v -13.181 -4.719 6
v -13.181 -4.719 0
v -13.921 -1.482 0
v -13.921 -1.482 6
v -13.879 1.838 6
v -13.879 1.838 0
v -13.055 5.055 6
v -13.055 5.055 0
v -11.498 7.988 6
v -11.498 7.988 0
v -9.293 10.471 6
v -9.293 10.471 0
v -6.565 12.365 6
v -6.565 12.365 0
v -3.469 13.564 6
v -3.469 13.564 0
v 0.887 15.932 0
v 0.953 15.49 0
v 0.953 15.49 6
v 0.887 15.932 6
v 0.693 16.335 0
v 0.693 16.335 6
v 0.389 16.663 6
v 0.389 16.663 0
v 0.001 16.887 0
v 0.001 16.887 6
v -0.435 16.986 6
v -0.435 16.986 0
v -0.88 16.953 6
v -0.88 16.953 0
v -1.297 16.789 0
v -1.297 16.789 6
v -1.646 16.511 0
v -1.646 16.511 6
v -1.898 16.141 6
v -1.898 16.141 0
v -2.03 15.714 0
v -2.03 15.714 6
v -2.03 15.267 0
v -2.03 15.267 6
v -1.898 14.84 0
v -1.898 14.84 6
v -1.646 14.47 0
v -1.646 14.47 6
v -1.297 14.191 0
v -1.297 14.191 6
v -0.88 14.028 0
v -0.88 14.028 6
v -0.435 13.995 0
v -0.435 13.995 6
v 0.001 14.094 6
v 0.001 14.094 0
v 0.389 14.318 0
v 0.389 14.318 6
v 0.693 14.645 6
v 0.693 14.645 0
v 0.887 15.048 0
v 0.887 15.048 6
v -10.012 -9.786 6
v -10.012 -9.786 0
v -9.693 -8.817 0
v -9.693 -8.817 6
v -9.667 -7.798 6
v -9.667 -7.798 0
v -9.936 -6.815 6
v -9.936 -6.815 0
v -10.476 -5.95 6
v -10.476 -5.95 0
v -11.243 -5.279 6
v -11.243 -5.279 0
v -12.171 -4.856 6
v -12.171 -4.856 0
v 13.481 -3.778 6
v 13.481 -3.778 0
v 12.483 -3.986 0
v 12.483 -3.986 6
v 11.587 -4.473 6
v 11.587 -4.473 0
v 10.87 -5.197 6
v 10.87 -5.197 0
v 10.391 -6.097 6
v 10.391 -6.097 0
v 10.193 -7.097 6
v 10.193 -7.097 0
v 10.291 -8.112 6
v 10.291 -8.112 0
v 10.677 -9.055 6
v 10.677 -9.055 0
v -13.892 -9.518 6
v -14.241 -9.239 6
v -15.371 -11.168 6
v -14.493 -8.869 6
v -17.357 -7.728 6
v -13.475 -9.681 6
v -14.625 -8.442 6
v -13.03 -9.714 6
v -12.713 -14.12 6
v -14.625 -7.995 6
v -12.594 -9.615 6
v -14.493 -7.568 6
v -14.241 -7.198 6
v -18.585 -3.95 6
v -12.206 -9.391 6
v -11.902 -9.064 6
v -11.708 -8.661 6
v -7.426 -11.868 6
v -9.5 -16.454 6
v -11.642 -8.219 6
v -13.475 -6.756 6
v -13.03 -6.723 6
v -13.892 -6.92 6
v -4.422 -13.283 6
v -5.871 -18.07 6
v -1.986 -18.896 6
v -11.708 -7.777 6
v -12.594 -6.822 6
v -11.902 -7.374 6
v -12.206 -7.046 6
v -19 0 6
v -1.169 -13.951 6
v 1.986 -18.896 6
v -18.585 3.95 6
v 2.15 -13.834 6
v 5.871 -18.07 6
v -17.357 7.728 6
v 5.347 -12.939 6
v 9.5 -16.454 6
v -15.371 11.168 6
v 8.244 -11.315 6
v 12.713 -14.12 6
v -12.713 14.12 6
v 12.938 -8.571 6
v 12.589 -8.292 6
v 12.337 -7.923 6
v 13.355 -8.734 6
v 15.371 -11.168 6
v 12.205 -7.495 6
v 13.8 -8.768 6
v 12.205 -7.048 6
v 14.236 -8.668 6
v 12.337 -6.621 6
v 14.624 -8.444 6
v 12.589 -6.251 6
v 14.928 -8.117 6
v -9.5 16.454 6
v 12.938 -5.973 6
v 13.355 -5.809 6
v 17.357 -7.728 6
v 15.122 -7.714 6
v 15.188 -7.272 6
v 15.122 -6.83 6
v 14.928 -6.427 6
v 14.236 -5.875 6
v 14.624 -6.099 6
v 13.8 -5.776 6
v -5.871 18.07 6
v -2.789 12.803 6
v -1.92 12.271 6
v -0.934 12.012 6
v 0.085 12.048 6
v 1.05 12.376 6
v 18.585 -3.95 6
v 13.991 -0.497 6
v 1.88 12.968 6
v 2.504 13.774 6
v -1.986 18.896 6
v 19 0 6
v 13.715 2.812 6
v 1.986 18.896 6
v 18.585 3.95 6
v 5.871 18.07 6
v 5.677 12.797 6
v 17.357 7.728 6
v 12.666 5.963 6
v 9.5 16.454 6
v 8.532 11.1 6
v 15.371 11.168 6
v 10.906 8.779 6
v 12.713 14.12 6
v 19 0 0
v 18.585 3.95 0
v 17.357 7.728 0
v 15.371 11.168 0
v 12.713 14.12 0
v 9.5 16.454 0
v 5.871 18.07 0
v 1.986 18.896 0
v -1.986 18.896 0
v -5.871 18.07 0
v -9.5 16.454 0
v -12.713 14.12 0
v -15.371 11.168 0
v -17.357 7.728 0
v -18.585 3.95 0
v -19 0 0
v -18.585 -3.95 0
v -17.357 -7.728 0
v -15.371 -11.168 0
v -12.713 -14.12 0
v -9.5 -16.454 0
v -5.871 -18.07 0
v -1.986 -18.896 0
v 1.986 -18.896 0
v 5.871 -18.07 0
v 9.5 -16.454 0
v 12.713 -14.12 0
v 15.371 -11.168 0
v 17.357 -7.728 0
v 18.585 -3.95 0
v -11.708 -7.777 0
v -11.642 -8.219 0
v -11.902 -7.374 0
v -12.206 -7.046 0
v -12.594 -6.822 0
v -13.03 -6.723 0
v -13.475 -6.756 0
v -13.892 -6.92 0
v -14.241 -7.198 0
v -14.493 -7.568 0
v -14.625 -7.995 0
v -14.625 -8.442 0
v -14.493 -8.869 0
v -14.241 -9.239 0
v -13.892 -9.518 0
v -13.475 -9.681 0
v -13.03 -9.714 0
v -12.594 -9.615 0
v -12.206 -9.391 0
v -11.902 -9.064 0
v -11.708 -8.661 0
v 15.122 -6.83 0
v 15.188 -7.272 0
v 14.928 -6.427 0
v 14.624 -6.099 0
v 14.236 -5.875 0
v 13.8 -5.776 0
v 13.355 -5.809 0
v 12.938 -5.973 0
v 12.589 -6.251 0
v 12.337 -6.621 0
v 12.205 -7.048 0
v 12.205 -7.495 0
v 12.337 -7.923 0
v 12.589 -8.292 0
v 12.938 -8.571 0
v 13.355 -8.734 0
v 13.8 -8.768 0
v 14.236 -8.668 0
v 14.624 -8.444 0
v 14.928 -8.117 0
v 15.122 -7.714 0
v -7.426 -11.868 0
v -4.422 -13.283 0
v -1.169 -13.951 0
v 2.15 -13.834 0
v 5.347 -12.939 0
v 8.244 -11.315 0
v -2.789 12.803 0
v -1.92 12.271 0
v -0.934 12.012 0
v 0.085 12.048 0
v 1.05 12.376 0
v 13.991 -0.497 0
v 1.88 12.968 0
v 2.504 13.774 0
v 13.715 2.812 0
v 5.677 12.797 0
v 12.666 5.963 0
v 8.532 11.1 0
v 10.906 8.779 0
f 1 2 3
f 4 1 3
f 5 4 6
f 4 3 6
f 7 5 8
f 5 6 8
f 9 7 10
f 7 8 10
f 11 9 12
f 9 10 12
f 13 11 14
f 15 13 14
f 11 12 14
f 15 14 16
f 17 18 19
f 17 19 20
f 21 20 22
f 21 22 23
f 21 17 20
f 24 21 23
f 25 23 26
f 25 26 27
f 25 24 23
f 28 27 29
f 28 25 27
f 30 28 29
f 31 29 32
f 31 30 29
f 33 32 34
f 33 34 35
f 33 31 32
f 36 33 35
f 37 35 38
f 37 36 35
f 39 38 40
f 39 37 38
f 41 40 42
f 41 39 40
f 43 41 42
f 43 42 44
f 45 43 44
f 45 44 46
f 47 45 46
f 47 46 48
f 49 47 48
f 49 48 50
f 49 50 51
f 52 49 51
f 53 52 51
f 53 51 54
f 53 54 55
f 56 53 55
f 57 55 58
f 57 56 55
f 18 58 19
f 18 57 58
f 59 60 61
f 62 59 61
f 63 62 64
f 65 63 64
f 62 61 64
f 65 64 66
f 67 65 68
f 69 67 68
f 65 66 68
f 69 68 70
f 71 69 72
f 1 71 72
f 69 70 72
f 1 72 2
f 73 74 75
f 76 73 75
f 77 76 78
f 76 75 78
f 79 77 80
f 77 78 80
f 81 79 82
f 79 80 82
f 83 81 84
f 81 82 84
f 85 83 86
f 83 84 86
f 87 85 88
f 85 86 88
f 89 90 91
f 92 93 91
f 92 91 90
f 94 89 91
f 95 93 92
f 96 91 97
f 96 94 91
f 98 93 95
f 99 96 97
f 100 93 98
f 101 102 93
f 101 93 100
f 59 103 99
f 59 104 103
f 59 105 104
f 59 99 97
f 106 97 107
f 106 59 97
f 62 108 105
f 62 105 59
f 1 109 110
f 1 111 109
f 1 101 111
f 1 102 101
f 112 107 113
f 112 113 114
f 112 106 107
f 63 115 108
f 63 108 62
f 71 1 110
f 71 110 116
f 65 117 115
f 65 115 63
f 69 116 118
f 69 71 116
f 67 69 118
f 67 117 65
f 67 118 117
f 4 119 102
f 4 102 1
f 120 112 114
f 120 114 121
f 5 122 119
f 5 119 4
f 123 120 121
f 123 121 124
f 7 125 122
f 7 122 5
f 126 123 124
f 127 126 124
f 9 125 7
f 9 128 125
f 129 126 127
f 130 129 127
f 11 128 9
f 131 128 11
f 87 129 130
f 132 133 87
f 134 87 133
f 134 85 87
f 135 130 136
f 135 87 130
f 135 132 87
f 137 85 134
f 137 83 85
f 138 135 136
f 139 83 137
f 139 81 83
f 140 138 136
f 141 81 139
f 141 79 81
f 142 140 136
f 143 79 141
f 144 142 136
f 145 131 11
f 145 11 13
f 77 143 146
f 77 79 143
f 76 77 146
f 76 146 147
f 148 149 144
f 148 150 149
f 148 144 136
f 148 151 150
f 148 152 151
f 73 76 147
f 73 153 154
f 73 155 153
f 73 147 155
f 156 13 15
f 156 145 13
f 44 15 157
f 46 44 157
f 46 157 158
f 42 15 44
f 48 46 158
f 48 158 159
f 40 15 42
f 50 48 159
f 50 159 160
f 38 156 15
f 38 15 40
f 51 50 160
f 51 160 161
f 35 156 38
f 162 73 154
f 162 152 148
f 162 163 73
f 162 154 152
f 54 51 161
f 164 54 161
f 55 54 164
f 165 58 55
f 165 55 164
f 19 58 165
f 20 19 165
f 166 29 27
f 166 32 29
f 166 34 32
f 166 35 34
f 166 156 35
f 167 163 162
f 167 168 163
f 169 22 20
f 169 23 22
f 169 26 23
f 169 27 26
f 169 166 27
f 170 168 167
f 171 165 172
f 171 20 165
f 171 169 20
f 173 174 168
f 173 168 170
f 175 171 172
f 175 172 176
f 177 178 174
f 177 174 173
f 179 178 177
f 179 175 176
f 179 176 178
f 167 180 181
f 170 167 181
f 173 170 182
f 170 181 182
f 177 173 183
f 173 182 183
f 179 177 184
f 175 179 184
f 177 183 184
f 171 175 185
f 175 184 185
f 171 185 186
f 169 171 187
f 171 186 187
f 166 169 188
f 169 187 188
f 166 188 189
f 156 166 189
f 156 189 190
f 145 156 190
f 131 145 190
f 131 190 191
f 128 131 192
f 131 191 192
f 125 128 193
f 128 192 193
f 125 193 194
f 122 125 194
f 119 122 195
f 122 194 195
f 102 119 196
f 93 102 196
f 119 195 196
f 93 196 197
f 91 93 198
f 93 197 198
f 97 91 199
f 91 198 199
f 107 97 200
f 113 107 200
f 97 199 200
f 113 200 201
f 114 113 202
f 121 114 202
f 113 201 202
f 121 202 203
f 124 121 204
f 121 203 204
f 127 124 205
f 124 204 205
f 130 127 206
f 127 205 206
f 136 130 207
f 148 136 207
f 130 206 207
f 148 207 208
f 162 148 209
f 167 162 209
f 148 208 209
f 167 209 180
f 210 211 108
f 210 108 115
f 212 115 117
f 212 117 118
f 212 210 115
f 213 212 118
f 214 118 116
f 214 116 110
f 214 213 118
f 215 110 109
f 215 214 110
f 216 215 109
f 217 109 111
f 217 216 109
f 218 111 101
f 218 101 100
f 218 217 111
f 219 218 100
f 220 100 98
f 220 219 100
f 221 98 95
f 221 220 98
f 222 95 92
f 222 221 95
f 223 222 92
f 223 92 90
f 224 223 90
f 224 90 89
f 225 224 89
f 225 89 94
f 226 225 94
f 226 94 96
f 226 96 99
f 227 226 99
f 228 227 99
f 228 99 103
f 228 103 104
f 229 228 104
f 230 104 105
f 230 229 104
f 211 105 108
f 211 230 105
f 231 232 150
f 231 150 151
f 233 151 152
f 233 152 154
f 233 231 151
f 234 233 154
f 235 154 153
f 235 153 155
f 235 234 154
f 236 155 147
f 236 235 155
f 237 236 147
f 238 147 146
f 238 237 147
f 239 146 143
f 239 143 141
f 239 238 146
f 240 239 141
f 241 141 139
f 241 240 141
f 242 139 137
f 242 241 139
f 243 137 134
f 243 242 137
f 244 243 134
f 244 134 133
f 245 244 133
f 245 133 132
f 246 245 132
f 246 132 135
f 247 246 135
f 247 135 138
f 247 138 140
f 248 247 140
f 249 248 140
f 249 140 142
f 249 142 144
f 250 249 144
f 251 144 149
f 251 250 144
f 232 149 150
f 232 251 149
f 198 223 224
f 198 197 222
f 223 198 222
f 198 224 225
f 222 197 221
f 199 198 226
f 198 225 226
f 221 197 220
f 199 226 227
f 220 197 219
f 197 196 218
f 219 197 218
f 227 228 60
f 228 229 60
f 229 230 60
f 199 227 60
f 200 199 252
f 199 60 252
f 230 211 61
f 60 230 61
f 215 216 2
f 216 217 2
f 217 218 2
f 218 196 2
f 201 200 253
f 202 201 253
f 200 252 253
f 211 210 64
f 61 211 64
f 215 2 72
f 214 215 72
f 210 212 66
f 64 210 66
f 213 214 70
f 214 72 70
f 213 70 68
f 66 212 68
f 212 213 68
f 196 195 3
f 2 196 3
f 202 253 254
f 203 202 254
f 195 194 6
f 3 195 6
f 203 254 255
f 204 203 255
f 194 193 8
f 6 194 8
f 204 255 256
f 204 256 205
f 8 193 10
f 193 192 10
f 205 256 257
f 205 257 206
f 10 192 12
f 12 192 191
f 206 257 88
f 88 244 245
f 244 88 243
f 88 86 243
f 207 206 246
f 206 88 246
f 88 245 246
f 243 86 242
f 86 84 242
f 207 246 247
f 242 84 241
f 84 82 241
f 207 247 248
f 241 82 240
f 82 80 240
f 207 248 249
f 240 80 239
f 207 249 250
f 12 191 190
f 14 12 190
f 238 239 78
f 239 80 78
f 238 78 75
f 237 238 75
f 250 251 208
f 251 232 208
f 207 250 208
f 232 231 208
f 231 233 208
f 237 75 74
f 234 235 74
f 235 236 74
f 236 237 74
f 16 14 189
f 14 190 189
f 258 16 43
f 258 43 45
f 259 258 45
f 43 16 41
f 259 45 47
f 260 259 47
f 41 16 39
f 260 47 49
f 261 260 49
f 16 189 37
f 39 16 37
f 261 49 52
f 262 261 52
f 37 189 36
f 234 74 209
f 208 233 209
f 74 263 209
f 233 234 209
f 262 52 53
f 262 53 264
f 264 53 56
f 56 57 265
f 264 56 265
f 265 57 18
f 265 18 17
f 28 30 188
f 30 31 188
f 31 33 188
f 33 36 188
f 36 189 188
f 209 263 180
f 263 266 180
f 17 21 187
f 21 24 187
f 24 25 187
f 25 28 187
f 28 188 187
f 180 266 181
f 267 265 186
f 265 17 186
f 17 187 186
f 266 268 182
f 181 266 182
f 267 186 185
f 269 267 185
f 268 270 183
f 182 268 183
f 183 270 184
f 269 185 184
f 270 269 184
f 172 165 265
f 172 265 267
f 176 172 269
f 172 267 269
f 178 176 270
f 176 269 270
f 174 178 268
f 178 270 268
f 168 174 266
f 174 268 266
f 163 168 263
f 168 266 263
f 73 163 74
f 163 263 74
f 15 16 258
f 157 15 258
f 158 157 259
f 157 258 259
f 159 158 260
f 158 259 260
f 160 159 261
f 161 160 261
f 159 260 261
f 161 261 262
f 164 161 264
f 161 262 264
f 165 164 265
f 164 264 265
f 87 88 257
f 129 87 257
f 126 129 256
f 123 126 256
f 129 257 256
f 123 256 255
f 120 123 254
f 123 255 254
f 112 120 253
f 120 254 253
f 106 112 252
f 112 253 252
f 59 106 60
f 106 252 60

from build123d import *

# Parameters (mm, degrees)
ESQUISSE1_R        = 19
ESQUISSE1_R_2      = 1.5
BOSS_EXTRU_2_DEPTH = 6


with BuildPart() as part:
    # Esquisse1 → Boss.-Extru.2 (new body)
    with BuildSketch(Plane.XY):
        Circle(ESQUISSE1_R)
        with Locations((-0.546712729, 15.490355231)):
            Circle(ESQUISSE1_R_2, mode=Mode.SUBTRACT)
        with Locations((-13.14168478, -8.218644727)):
            Circle(ESQUISSE1_R_2, mode=Mode.SUBTRACT)
        with Locations((13.688397508, -7.271710504)):
            Circle(ESQUISSE1_R_2, mode=Mode.SUBTRACT)
        with BuildLine():
            ThreePointArc((-3.468577117, 13.56351624), (-0.423261467, 11.992533082), (2.503723019, 13.774301109))
            ThreePointArc((2.503723019, 13.774301109), (11.869908833, 7.423292012), (13.480638187, -3.777882222))
            ThreePointArc((13.480638187, -3.777882222), (10.597469039, -5.629711358), (10.677033171, -9.055438293))
            ThreePointArc((10.677033171, -9.055438293), (0.493805045, -13.991288596), (-10.01206107, -9.785634018))
            ThreePointArc((-10.01206107, -9.785634018), (-10.174207571, -6.362821724), (-13.180756189, -4.718862816))
            ThreePointArc((-13.180756189, -4.718862816), (-12.363713879, 6.567996584), (-3.468577117, 13.56351624))
        make_face(mode=Mode.SUBTRACT)
    extrude(amount=BOSS_EXTRU_2_DEPTH)


solid = part.part
